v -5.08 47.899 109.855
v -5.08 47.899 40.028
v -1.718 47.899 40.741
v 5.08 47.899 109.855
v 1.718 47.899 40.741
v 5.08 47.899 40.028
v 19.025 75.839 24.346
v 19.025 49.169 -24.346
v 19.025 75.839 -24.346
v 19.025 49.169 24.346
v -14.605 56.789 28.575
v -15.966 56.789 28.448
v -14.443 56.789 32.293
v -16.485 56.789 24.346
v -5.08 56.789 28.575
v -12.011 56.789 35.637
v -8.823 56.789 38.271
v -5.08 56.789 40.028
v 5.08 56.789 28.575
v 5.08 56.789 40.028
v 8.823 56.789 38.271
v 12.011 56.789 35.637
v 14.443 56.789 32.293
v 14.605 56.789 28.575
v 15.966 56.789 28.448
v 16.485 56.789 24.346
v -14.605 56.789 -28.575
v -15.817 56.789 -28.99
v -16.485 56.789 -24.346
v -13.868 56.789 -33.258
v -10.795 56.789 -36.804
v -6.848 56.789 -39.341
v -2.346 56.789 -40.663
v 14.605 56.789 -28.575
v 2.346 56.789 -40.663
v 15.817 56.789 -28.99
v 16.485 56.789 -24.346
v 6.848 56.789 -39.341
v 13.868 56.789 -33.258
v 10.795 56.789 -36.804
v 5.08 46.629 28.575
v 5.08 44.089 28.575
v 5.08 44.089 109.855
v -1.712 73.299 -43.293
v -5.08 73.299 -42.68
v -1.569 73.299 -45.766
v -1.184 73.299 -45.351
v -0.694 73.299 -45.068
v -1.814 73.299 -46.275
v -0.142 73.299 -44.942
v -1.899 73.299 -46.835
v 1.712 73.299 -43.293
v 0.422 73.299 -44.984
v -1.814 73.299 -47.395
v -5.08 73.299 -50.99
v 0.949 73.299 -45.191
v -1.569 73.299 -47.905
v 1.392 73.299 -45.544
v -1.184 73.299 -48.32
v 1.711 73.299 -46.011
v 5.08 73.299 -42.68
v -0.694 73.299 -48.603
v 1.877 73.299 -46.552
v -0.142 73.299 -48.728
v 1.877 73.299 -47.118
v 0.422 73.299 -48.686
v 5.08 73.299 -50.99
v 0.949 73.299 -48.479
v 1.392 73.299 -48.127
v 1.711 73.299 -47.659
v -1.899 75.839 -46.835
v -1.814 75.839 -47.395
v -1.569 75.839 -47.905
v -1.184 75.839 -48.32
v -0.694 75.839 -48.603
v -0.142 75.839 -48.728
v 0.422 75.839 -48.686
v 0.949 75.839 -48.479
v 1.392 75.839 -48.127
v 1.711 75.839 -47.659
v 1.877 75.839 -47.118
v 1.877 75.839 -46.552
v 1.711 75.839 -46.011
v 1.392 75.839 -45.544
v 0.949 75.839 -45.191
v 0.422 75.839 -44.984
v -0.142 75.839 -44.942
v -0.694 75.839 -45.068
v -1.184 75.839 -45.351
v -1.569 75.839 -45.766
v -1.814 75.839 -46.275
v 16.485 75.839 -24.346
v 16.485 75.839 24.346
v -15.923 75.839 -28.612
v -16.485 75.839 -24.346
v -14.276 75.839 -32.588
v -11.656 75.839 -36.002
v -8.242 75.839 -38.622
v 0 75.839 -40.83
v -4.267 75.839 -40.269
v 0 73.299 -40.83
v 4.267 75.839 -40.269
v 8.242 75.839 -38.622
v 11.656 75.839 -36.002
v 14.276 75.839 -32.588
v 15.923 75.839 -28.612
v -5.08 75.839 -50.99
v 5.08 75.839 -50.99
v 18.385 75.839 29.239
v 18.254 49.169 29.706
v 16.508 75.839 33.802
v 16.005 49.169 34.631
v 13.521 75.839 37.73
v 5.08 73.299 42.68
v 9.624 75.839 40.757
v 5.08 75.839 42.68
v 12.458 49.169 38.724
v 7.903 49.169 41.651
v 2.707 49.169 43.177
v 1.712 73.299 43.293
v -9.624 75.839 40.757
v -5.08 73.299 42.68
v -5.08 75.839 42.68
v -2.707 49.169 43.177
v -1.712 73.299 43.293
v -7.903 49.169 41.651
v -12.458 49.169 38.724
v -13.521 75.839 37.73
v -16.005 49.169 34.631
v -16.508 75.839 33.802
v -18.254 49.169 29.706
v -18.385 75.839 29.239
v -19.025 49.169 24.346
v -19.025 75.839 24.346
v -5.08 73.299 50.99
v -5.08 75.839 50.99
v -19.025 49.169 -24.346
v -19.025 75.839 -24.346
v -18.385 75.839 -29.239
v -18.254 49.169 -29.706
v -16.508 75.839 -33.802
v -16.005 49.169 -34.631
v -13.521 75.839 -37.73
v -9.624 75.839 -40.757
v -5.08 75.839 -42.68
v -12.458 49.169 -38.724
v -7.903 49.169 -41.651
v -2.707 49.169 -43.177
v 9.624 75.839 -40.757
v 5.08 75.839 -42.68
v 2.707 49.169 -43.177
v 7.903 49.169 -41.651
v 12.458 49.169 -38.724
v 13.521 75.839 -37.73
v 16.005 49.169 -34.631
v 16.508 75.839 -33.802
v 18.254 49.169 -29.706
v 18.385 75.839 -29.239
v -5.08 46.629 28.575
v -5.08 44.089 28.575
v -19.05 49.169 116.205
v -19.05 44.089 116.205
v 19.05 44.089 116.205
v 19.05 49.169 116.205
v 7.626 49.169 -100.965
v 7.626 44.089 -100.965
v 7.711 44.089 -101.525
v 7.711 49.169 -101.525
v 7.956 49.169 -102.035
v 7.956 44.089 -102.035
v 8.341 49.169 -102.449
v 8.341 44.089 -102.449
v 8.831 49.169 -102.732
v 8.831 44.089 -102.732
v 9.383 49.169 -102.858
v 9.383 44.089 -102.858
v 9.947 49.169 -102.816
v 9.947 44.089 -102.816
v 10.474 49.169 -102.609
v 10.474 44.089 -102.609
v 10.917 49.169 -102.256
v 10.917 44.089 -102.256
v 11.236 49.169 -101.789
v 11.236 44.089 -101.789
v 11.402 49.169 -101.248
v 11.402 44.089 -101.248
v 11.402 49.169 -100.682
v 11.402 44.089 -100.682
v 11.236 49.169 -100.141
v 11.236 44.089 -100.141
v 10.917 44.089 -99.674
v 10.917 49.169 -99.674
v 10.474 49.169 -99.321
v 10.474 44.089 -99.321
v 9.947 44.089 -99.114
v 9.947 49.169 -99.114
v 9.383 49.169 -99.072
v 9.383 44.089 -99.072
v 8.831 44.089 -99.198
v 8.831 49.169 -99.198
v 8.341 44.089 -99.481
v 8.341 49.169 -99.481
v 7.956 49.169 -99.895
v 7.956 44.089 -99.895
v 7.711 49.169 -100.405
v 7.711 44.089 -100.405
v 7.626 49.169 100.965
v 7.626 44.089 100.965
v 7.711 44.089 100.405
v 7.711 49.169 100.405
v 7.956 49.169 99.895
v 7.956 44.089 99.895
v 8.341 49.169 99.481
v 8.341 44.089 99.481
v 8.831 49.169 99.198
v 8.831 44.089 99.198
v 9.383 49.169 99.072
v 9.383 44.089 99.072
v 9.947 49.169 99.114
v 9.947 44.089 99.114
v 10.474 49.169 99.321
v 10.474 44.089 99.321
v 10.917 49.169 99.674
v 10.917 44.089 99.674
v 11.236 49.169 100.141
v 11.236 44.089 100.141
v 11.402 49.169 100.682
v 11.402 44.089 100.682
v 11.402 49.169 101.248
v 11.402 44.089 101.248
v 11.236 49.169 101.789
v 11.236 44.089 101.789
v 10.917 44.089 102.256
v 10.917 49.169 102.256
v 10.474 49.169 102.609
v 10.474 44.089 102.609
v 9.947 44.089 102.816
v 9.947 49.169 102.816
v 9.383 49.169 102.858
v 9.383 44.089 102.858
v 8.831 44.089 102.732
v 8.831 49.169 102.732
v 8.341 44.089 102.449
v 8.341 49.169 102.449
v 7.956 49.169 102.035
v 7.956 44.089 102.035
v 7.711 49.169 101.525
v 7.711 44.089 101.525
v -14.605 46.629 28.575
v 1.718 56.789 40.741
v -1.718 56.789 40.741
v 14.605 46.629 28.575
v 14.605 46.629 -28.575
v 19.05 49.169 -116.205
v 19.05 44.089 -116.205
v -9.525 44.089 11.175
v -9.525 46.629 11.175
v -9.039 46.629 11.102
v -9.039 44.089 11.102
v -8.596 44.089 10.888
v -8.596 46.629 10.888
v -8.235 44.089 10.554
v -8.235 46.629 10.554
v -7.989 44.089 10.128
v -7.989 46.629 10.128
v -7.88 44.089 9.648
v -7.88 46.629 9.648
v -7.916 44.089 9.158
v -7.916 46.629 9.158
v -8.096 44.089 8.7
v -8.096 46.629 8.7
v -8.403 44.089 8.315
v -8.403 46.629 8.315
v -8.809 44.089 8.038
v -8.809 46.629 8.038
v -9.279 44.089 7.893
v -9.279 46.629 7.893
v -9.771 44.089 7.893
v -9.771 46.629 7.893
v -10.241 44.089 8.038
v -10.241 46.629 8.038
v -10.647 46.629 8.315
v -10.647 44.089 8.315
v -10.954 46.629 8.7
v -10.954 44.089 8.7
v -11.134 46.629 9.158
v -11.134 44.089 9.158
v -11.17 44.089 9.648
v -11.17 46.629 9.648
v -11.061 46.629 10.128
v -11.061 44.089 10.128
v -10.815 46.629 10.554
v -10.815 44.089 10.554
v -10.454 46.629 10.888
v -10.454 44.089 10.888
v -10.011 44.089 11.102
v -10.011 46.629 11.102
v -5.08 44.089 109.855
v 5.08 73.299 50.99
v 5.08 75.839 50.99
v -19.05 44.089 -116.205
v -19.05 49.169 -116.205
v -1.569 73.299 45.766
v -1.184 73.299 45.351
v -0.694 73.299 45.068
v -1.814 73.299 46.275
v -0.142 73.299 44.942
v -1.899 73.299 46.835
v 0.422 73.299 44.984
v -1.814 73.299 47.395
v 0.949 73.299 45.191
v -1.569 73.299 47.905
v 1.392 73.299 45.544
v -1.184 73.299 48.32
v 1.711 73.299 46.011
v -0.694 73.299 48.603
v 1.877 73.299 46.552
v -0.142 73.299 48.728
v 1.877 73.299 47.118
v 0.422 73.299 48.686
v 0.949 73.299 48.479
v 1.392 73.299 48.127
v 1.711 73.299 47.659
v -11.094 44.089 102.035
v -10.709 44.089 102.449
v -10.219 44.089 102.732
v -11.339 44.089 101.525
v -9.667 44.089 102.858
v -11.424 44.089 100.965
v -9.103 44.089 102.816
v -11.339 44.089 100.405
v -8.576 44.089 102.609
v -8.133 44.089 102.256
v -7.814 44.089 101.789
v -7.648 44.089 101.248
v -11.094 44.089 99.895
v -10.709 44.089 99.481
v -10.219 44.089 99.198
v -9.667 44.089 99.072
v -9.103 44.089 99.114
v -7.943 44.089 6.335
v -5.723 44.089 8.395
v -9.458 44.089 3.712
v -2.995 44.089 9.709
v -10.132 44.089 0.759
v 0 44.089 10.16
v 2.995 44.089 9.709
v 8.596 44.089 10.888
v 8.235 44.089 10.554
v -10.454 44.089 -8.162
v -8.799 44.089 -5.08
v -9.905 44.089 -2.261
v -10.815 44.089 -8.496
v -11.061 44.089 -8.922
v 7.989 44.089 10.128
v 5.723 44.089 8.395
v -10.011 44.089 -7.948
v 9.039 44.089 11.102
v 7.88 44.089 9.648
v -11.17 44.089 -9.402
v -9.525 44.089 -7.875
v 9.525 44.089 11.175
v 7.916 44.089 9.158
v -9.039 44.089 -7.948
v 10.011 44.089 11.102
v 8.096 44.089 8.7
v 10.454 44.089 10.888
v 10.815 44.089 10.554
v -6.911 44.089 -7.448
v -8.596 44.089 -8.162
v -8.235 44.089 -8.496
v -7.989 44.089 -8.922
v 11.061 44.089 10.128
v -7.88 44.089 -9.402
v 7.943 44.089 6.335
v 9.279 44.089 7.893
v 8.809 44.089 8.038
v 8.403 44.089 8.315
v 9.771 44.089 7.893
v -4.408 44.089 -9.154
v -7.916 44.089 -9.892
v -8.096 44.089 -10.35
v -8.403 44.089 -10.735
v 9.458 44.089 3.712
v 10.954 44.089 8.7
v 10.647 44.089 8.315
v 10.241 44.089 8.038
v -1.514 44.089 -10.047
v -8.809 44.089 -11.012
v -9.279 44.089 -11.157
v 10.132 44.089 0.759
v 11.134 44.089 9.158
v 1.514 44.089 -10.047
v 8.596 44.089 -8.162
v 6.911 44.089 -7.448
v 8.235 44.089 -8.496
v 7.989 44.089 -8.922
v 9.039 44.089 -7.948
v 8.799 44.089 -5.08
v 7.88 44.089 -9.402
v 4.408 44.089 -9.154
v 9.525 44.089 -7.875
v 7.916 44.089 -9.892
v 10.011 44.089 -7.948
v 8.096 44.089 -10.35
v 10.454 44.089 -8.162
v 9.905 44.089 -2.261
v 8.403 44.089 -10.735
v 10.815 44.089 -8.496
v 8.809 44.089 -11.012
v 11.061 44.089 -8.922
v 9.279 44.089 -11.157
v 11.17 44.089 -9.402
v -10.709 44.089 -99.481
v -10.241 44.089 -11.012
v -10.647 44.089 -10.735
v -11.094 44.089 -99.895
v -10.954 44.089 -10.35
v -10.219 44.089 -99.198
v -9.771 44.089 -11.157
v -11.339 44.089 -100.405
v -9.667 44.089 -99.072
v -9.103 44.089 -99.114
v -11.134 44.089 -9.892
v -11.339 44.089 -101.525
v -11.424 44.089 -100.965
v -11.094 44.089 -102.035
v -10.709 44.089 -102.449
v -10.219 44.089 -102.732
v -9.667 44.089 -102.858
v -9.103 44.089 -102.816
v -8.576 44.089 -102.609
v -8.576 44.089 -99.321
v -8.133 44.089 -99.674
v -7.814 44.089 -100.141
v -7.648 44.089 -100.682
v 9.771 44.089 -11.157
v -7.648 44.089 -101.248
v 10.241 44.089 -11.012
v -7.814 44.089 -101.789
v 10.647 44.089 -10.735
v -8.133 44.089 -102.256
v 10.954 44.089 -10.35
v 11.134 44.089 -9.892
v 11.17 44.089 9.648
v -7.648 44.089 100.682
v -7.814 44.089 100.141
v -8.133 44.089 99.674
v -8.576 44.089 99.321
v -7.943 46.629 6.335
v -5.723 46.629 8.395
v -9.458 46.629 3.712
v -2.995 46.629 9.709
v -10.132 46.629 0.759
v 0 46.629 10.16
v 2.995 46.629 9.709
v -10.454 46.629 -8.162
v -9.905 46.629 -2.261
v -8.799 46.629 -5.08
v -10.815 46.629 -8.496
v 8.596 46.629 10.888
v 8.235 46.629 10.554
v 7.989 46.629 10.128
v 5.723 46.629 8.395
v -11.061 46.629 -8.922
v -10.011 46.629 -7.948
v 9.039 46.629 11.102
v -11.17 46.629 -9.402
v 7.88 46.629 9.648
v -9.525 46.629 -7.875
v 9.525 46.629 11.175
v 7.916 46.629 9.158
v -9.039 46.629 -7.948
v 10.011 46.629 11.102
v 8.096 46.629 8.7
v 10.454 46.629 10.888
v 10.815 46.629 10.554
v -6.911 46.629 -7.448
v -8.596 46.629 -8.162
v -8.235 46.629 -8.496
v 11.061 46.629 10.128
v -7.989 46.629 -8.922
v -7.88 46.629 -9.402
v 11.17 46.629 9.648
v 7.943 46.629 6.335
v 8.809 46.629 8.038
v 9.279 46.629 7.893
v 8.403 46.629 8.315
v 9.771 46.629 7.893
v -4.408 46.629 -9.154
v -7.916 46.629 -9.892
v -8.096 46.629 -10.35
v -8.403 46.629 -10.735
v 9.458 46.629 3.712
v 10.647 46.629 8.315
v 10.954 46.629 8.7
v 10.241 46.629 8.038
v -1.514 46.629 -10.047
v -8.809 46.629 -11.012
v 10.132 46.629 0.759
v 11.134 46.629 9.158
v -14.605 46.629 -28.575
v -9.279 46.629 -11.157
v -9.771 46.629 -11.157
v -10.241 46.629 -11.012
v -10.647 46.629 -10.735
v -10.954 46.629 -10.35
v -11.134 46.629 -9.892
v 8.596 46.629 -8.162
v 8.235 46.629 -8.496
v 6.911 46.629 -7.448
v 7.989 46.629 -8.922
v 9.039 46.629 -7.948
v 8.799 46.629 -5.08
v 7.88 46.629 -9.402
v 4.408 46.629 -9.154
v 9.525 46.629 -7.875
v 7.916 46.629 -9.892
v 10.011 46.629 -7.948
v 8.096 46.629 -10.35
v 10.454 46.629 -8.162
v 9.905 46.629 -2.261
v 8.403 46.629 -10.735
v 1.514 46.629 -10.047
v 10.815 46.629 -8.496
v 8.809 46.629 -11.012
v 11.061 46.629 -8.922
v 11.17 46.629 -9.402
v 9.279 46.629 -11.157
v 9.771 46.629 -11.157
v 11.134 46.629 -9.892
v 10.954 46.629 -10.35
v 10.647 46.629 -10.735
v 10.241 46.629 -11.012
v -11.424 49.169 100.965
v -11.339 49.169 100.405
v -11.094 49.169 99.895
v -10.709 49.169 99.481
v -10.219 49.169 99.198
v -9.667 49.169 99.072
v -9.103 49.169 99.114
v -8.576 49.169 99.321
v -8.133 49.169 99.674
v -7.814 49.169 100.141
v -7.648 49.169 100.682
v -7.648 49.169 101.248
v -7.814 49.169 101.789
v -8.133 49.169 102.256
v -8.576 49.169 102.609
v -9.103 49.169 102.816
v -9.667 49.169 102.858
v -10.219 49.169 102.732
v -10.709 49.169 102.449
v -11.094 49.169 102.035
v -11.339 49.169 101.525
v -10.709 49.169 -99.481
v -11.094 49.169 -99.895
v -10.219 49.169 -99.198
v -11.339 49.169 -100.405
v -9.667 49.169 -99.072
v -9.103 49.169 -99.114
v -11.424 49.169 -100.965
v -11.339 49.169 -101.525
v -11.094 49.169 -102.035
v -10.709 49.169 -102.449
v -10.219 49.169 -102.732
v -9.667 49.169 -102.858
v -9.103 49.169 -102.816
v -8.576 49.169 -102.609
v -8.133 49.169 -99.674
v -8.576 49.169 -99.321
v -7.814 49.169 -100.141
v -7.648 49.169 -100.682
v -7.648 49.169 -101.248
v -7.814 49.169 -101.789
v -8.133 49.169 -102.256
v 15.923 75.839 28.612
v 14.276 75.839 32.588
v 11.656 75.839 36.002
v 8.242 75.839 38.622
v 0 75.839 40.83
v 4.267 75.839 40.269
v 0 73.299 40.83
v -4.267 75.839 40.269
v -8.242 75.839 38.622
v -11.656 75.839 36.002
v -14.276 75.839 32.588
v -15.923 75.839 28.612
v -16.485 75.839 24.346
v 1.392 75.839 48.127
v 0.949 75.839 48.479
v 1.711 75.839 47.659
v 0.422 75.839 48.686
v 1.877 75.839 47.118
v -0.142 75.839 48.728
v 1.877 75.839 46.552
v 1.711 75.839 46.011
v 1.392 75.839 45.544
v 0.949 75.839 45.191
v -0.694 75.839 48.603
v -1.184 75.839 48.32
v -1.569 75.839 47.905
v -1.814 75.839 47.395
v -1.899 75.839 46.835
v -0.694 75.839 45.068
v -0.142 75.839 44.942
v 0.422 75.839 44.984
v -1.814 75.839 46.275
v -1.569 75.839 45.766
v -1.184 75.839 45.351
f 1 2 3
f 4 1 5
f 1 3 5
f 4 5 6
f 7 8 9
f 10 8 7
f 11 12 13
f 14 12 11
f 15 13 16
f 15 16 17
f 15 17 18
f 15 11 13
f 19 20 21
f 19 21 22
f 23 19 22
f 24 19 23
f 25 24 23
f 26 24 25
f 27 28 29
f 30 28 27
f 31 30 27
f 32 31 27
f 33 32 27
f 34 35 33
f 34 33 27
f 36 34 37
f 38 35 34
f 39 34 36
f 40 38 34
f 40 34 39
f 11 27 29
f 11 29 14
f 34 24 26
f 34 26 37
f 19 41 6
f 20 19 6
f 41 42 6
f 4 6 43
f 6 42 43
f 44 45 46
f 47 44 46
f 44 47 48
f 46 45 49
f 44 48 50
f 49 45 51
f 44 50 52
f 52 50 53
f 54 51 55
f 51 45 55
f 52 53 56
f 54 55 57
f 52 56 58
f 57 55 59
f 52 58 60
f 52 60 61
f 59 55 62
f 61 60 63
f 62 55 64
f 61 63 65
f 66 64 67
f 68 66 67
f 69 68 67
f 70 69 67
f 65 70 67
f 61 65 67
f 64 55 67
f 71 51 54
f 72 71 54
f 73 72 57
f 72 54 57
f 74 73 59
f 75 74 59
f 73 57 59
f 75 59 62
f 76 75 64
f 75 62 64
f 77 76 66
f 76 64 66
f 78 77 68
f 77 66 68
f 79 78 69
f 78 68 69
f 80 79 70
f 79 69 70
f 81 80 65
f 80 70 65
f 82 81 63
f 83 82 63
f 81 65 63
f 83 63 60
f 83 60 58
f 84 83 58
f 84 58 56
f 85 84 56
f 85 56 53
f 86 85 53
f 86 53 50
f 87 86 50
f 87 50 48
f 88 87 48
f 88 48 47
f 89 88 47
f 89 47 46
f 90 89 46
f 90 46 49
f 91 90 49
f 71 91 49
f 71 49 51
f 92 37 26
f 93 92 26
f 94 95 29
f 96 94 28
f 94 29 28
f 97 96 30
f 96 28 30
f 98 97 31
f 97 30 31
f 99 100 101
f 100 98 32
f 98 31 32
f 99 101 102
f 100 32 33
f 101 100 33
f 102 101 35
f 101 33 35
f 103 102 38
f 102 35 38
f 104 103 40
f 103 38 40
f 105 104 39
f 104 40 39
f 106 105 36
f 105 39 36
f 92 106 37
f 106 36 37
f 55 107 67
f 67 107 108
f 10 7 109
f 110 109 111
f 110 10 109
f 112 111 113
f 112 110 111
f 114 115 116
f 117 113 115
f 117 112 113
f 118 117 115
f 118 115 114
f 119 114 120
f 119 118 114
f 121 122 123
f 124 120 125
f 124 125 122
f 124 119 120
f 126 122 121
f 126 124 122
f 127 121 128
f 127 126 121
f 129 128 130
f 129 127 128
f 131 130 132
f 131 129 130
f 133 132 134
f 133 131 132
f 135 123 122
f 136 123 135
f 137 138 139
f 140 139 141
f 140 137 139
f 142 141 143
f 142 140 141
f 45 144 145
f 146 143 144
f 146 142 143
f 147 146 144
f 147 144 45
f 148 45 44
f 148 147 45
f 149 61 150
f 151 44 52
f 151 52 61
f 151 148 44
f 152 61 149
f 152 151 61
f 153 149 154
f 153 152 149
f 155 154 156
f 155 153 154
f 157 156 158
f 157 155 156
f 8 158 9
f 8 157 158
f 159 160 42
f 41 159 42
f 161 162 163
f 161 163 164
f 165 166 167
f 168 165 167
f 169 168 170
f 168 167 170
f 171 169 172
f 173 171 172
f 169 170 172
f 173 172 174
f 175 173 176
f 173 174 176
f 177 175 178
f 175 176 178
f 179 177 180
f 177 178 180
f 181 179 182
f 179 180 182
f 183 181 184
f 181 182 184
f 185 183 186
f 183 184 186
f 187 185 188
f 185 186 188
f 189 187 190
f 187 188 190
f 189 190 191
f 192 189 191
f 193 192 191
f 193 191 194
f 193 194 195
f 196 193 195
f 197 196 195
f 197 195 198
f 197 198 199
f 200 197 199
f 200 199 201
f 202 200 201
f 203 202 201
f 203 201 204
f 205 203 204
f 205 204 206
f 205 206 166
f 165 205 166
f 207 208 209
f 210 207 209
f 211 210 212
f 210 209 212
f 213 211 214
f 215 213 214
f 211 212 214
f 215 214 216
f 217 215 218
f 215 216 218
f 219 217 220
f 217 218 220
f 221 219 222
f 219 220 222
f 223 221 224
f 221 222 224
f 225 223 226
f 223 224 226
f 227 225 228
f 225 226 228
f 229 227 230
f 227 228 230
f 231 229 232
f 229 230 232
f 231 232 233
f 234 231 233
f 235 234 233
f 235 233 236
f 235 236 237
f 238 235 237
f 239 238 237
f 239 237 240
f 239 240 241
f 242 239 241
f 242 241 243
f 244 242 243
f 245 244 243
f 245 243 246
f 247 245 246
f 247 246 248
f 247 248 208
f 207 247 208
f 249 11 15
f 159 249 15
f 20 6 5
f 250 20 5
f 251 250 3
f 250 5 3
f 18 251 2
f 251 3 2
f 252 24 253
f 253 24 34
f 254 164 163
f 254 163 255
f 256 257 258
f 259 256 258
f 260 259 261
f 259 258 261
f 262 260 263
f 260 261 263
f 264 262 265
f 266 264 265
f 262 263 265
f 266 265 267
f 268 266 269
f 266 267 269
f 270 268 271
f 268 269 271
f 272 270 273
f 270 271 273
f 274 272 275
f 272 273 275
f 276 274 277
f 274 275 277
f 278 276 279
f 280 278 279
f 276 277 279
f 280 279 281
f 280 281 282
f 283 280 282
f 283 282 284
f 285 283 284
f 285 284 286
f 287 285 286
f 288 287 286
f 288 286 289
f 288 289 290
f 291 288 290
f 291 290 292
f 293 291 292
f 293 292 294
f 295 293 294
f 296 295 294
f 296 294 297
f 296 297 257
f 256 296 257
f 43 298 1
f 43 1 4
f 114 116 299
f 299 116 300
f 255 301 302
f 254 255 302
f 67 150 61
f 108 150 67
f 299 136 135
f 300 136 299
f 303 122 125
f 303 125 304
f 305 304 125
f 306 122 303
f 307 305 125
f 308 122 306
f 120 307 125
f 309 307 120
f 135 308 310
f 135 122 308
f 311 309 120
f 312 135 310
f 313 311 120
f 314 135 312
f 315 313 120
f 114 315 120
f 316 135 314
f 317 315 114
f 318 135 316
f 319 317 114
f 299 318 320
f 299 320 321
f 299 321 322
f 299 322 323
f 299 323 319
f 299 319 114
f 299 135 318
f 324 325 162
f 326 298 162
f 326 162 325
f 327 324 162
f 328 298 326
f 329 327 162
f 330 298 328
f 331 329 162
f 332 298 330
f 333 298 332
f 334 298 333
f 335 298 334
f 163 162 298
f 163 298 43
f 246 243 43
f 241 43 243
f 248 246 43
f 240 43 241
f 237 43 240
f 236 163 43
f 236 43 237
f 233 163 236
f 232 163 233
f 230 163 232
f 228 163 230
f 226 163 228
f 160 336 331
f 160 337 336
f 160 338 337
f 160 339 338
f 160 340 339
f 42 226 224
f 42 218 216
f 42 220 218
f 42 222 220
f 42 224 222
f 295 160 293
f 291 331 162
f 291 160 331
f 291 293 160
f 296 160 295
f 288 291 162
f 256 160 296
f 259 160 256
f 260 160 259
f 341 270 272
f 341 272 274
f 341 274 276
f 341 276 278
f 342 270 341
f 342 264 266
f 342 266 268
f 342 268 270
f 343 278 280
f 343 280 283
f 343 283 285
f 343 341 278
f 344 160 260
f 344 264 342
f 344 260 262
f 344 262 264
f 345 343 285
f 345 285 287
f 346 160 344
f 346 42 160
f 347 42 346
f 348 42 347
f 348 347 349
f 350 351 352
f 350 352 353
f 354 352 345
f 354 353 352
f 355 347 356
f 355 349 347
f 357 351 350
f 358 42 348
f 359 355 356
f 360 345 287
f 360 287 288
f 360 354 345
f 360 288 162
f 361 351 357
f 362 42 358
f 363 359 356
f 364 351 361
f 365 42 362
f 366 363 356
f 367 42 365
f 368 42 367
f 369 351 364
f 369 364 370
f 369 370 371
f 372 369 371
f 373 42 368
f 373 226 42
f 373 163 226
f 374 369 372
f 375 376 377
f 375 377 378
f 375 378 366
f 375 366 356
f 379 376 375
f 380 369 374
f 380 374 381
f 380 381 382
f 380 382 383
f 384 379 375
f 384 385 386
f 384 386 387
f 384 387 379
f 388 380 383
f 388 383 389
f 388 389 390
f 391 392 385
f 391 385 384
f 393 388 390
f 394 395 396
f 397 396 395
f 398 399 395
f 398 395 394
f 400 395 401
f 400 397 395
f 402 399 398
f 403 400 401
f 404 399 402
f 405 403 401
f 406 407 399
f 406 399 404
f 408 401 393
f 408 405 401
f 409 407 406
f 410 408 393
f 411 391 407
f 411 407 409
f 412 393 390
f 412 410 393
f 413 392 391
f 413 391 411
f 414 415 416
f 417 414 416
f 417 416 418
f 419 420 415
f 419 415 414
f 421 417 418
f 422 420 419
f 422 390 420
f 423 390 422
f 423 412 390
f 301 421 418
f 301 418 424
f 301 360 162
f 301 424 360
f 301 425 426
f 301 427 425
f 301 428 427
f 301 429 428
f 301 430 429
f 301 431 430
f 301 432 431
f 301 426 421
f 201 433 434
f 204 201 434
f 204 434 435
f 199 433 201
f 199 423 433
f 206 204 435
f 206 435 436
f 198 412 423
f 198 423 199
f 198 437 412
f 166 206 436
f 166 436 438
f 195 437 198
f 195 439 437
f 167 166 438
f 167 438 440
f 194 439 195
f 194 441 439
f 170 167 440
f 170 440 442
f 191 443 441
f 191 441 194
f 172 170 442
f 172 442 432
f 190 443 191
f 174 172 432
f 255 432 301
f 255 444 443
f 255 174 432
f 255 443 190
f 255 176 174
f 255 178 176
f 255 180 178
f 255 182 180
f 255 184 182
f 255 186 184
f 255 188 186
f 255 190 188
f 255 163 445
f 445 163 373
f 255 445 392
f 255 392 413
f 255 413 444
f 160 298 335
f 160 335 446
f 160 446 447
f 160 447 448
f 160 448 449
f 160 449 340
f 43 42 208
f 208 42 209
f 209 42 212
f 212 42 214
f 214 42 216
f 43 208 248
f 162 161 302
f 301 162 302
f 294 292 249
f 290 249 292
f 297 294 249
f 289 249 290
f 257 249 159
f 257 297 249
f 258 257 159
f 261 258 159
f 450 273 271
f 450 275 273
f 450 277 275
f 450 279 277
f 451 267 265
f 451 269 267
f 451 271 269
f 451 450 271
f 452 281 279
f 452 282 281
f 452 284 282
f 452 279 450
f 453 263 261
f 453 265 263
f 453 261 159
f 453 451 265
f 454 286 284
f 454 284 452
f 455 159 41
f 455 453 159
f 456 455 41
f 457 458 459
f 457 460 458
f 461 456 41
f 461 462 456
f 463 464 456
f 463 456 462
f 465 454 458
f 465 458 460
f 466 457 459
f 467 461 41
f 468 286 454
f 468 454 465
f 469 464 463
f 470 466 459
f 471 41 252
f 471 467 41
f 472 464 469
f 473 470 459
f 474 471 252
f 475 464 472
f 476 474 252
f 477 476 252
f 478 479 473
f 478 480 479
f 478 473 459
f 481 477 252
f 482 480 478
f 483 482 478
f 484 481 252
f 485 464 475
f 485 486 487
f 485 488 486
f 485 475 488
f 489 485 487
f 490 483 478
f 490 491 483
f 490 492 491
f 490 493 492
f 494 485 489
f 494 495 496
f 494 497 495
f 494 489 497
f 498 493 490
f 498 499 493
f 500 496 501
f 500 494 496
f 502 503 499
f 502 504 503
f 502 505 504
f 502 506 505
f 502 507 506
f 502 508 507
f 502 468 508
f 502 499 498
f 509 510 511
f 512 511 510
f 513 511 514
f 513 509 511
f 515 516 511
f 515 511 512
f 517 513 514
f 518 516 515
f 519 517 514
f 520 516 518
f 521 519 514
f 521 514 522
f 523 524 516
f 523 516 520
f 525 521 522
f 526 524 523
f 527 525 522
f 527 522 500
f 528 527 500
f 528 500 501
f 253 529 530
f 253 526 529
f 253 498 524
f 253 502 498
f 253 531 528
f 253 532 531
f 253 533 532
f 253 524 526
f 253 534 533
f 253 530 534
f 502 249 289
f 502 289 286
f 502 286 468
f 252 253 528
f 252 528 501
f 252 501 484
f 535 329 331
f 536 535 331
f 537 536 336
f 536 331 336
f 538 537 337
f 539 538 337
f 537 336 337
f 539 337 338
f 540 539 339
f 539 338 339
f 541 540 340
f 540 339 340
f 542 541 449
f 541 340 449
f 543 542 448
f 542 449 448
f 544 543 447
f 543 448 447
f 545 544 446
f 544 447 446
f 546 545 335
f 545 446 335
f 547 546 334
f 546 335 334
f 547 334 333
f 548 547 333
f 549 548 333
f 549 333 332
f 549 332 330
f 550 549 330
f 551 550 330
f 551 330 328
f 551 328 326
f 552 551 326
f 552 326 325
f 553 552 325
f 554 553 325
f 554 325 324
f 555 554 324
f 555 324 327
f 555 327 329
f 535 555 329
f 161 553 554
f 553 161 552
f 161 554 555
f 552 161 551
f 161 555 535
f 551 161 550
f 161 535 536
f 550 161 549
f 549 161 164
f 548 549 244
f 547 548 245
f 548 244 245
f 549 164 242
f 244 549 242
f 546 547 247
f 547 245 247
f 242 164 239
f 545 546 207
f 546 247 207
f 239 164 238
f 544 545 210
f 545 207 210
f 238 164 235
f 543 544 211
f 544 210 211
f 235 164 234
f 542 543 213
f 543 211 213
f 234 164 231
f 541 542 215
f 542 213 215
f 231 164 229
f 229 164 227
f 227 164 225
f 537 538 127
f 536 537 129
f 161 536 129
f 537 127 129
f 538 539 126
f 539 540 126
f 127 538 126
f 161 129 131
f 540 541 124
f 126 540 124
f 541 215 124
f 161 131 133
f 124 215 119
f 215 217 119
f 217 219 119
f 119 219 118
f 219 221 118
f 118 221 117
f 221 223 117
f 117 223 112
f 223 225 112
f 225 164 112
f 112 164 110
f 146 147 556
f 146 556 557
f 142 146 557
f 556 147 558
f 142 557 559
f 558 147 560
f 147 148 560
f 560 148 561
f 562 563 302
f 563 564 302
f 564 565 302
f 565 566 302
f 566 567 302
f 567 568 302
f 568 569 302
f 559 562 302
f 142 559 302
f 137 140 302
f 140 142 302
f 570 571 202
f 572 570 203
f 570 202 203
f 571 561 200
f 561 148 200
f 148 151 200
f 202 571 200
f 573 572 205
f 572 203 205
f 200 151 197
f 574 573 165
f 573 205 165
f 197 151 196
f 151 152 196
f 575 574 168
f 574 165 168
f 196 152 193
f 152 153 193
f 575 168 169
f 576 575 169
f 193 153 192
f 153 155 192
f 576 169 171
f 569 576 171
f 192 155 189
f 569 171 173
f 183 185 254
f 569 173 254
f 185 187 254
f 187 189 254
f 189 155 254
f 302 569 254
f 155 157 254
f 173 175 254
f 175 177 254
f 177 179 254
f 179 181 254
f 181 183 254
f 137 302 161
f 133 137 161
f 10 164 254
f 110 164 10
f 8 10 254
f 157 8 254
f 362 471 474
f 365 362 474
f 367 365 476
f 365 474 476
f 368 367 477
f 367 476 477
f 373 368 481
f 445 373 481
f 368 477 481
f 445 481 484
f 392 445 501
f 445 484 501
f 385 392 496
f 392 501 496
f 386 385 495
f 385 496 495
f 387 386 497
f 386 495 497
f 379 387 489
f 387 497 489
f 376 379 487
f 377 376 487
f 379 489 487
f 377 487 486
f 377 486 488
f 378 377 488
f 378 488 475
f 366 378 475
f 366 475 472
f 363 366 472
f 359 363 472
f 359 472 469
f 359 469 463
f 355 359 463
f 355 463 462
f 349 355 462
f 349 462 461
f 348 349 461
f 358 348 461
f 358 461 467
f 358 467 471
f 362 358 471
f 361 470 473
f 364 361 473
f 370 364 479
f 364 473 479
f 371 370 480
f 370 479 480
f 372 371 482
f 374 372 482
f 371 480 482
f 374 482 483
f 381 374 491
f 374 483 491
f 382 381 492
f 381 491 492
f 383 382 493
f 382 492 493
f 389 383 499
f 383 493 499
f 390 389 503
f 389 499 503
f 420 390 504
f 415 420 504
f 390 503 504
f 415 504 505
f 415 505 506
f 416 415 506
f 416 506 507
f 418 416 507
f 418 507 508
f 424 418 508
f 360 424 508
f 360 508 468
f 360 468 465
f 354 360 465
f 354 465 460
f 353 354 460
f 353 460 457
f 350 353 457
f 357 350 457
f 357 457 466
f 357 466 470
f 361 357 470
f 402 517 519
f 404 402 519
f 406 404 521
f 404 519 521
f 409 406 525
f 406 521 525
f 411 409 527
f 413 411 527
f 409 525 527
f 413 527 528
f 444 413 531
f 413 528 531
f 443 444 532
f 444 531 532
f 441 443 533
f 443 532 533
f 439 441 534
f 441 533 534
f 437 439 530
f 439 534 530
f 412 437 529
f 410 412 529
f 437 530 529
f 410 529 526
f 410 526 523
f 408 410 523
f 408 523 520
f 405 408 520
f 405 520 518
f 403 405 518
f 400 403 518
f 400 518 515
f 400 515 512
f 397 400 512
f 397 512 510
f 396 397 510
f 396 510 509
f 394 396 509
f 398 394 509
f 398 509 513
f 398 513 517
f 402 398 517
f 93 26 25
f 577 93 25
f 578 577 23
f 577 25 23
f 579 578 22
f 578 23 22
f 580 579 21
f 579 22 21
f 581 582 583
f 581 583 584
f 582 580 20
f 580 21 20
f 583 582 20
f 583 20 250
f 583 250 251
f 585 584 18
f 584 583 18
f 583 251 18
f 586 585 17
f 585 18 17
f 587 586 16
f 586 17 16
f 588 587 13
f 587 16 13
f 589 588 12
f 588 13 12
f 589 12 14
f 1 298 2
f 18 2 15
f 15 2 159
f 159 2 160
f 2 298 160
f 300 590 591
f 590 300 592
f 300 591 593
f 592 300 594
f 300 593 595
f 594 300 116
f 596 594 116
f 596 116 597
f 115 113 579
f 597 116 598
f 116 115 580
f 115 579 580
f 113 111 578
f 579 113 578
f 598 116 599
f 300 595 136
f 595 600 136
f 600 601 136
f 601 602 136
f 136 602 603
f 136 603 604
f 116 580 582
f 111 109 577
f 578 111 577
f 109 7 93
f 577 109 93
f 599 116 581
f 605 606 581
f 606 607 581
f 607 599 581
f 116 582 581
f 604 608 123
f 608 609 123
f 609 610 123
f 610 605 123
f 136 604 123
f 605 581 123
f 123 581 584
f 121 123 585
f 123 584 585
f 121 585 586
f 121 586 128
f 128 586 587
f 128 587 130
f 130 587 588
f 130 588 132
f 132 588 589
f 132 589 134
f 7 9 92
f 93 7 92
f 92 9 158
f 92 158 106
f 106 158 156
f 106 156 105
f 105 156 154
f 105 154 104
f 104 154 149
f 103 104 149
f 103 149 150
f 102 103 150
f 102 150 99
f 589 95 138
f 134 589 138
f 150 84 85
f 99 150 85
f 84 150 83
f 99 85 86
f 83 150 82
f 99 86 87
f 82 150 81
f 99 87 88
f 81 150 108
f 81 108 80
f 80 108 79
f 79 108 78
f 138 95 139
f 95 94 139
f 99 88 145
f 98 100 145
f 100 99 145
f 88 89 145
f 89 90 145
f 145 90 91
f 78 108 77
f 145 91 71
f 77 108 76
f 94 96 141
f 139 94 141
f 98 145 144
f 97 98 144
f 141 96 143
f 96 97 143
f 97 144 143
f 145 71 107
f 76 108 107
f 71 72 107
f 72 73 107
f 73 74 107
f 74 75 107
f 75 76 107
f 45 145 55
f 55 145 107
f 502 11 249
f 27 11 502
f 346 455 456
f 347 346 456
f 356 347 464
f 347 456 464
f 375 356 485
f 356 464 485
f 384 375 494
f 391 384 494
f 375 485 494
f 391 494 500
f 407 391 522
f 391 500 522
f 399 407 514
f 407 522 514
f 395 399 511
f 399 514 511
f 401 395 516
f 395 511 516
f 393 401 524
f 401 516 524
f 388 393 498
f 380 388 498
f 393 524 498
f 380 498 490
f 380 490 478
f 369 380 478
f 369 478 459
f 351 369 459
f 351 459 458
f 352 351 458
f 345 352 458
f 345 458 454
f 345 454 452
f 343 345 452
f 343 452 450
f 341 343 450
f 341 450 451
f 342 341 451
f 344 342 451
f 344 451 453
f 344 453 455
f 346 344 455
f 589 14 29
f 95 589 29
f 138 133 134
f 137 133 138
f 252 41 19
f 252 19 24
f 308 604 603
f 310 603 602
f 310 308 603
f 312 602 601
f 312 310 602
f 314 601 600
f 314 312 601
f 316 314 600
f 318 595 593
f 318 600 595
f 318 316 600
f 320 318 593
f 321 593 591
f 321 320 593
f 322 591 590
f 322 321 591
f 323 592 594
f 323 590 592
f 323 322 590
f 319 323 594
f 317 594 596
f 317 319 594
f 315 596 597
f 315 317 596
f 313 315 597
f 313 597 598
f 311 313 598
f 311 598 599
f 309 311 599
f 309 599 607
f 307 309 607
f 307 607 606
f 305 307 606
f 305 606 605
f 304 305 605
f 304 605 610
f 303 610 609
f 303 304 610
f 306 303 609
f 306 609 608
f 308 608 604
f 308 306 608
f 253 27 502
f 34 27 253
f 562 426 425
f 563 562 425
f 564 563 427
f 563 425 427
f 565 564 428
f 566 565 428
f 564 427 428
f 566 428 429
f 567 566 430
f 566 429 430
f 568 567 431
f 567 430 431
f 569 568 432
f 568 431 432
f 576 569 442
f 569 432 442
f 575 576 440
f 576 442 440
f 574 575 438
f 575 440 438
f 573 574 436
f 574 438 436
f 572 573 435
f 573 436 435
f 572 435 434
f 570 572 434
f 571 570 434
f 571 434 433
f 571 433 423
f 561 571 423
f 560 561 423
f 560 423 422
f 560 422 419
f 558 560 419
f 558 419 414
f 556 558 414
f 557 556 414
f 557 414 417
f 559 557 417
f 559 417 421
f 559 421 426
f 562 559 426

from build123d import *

# Parameters (mm, degrees)
ESQUISSE1_W             = 232.41
ESQUISSE1_H             = 5.08
EXTRU_MINCE1_DEPTH      = 19.05
EXTRU_MINCE2_DEPTH      = 26.67
BOSS_EXTRU_2_DEPTH      = 7.62
ESQUISSE2_W             = 29.21
ESQUISSE2_H             = 57.15
ENL_V_MAT_EXTRU_1_DEPTH = 10.16
ENL_V_MAT_EXTRU_2_REACH = 123.325
ESQUISSE7_R             = 1.65
ESQUISSE8_R             = 10.16
ENL_V_MAT_EXTRU_3_DEPTH = 122.324888729
ESQUISSE9_W             = 10.16
ESQUISSE9_H             = 10.16
BOSS_EXTRU_1_DEPTH      = 2.54
D_GAGEMENT_61_D         = 3.7973
D_GAGEMENT_61_DEPTH     = 2.54
ESQUISSE12_W            = 10.16
ESQUISSE12_H            = 81.28
ENL_V_MAT_EXTRU_4_DEPTH = 3.81
ENL_V_START             = -8.89
ENL_V_MAT_EXTRU_5_DEPTH = 8.89
D_GAGEMENT_62_D         = 3.7973


with BuildPart() as part:
    # Esquisse1 → Extru.-Mince1 (new, symmetric)
    with BuildSketch(Plane(origin=(0, 0, 0), x_dir=(0, 0, -1), z_dir=(1, 0, 0))):
        with Locations((0, 46.628736397)):
            Rectangle(ESQUISSE1_W, ESQUISSE1_H)
    extrude(amount=EXTRU_MINCE1_DEPTH, both=True)

    # Esquisse6 → Extru.-Mince2 (add)
    with BuildSketch(Plane(origin=(0, 49.168736397, 0), x_dir=(1, 0, 0), z_dir=(0, 1, 0))):
        with BuildLine():
            Line((-19.0246, -24.3459), (-19.0246, 24.3459))
            ThreePointArc((-19.0246, 24.3459), (0, 43.3705), (19.0246, 24.3459))
            Line((19.0246, 24.3459), (19.0246, -24.3459))
            ThreePointArc((19.0246, -24.3459), (0, -43.3705), (-19.0246, -24.3459))
        make_face()
        with BuildLine():
            Line((-16.4846, -24.3459), (-16.4846, 24.3459))
            ThreePointArc((-16.4846, 24.3459), (0, 40.8305), (16.4846, 24.3459))
            Line((16.4846, 24.3459), (16.4846, -24.3459))
            ThreePointArc((16.4846, -24.3459), (0, -40.8305), (-16.4846, -24.3459))
        make_face(mode=Mode.SUBTRACT)
    extrude(amount=EXTRU_MINCE2_DEPTH)

    # Esquisse13 → Boss.-Extru.2 (add)
    with BuildSketch(Plane(origin=(0, 49.168736397, 0), x_dir=(1, 0, 0), z_dir=(0, 1, 0))):
        with BuildLine():
            Line((-16.4846, 24.3459), (-16.4846, -24.3459))
            ThreePointArc((-16.4846, -24.3459), (0, -40.8305), (16.4846, -24.3459))
            Line((16.4846, -24.3459), (16.4846, 24.3459))
            ThreePointArc((16.4846, 24.3459), (0, 40.8305), (-16.4846, 24.3459))
        make_face()
    extrude(amount=BOSS_EXTRU_2_DEPTH)

    # Esquisse2 → Enlèv. mat.-Extru.1 (cut)
    with BuildSketch(Plane(origin=(0, 56.788736397, 0), x_dir=(1, 0, 0), z_dir=(0, 1, 0))):
        Rectangle(ESQUISSE2_W, ESQUISSE2_H)
    extrude(amount=-ENL_V_MAT_EXTRU_1_DEPTH, mode=Mode.SUBTRACT)

    # Esquisse7 → Enlèv. mat.-Extru.2 (cut, up to next)
    with BuildSketch(Plane(origin=(0, 46.628736397, 0), x_dir=(1, 0, 0), z_dir=(0, 1, 0)), mode=Mode.PRIVATE) as enl_v_mat_extru_2_sk1:
        with Locations(Location((-9.525, 9.525, 0), (0, 0, 270))):
            Circle(ESQUISSE7_R)
    enl_v_mat_extru_2_tool1 = extrude(enl_v_mat_extru_2_sk1.sketch, amount=-ENL_V_MAT_EXTRU_2_REACH, mode=Mode.PRIVATE) & part.part
    # Esquisse7 → Enlèv. mat.-Extru.2 (cut, up to next)
    with BuildSketch(Plane(origin=(0, 46.628736397, 0), x_dir=(1, 0, 0), z_dir=(0, 1, 0)), mode=Mode.PRIVATE) as enl_v_mat_extru_2_sk2:
        with Locations(Location((9.525, 9.525, 0), (0, 0, 270))):
            Circle(ESQUISSE7_R)
    enl_v_mat_extru_2_tool2 = extrude(enl_v_mat_extru_2_sk2.sketch, amount=-ENL_V_MAT_EXTRU_2_REACH, mode=Mode.PRIVATE) & part.part
    # Esquisse7 → Enlèv. mat.-Extru.2 (cut, up to next)
    with BuildSketch(Plane(origin=(0, 46.628736397, 0), x_dir=(1, 0, 0), z_dir=(0, 1, 0)), mode=Mode.PRIVATE) as enl_v_mat_extru_2_sk3:
        with Locations(Location((9.525, -9.525, 0), (0, 0, 270))):
            Circle(ESQUISSE7_R)
    enl_v_mat_extru_2_tool3 = extrude(enl_v_mat_extru_2_sk3.sketch, amount=-ENL_V_MAT_EXTRU_2_REACH, mode=Mode.PRIVATE) & part.part
    # Esquisse7 → Enlèv. mat.-Extru.2 (cut, up to next)
    with BuildSketch(Plane(origin=(0, 46.628736397, 0), x_dir=(1, 0, 0), z_dir=(0, 1, 0)), mode=Mode.PRIVATE) as enl_v_mat_extru_2_sk4:
        with Locations(Location((-9.525, -9.525, 0), (0, 0, 270))):
            Circle(ESQUISSE7_R)
    enl_v_mat_extru_2_tool4 = extrude(enl_v_mat_extru_2_sk4.sketch, amount=-ENL_V_MAT_EXTRU_2_REACH, mode=Mode.PRIVATE) & part.part
    add(enl_v_mat_extru_2_tool1.solids().sort_by_distance((-9.525, 46.628736, -9.525))[0], mode=Mode.SUBTRACT)
    add(enl_v_mat_extru_2_tool2.solids().sort_by_distance((9.525, 46.628736, -9.525))[0], mode=Mode.SUBTRACT)
    add(enl_v_mat_extru_2_tool3.solids().sort_by_distance((9.525, 46.628736, 9.525))[0], mode=Mode.SUBTRACT)
    add(enl_v_mat_extru_2_tool4.solids().sort_by_distance((-9.525, 46.628736, 9.525))[0], mode=Mode.SUBTRACT)

    # Esquisse8 → Enlèv. mat.-Extru.3 (cut, through all)
    with BuildSketch(Plane(origin=(0, 46.628736397, 0), x_dir=(1, 0, 0), z_dir=(0, 1, 0))):
        with Locations(Location((0, 0, 0), (0, 0, 270))):
            Circle(ESQUISSE8_R)
    extrude(amount=-ENL_V_MAT_EXTRU_3_DEPTH, mode=Mode.SUBTRACT)

    # Esquisse9 → Boss.-Extru.1 (add)
    with BuildSketch(Plane(origin=(0, 75.838736397, 0), x_dir=(1, 0, 0), z_dir=(0, 1, 0))):
        with Locations((0, 45.9105)):
            Rectangle(ESQUISSE9_W, ESQUISSE9_H)
    boss_extru_1 = extrude(amount=-BOSS_EXTRU_1_DEPTH)

    # Dégagement #61
    with Locations(Plane(origin=(0, 75.838736397, 0), x_dir=(1, 0, 0), z_dir=(0, 1, 0))):
        with Locations((0, 46.835110673)):
            d_gagement_61 = Hole(D_GAGEMENT_61_D / 2, depth=D_GAGEMENT_61_DEPTH)

    # Symétrie1: Boss.-Extru.1, Dégagement #61 across plane
    add(boss_extru_1.mirror(Plane.XY))
    add(d_gagement_61.mirror(Plane.XY), mode=Mode.SUBTRACT)

    # Esquisse12 → Enlèv. mat.-Extru.4 (cut)
    with BuildSketch(Plane(origin=(0, 44.088736397, 0), x_dir=(1, 0, 0), z_dir=(0, 1, 0))):
        with Locations((0, -69.215)):
            Rectangle(ESQUISSE12_W, ESQUISSE12_H)
    extrude(amount=ENL_V_MAT_EXTRU_4_DEPTH, mode=Mode.SUBTRACT)

    # Esquisse14 → Enlèv. mat.-Extru.5 (cut)
    with BuildSketch(Plane(origin=(0, 56.788736397, 0), x_dir=(1, 0, 0), z_dir=(0, 1, 0)).offset(ENL_V_START)):
        with BuildLine():
            Line((-5.08, -28.575), (5.08, -28.575))
            Line((5.08, -28.575), (5.08, -40.028235195))
            ThreePointArc((5.08, -40.028235195), (0, -40.8305), (-5.08, -40.028235195))
            Line((-5.08, -40.028235195), (-5.08, -28.575))
        make_face()
    extrude(amount=ENL_V_MAT_EXTRU_5_DEPTH, mode=Mode.SUBTRACT)

    # Dégagement #62 (through all)
    with Locations(Plane(origin=(0, 49.168736397, 0), x_dir=(1, 0, 0), z_dir=(0, 1, 0))):
        with Locations((-9.525, 100.965), (9.525, 100.965), (9.525, -100.965), (-9.525, -100.965)):
            Hole(D_GAGEMENT_62_D / 2)


solid = part.part
